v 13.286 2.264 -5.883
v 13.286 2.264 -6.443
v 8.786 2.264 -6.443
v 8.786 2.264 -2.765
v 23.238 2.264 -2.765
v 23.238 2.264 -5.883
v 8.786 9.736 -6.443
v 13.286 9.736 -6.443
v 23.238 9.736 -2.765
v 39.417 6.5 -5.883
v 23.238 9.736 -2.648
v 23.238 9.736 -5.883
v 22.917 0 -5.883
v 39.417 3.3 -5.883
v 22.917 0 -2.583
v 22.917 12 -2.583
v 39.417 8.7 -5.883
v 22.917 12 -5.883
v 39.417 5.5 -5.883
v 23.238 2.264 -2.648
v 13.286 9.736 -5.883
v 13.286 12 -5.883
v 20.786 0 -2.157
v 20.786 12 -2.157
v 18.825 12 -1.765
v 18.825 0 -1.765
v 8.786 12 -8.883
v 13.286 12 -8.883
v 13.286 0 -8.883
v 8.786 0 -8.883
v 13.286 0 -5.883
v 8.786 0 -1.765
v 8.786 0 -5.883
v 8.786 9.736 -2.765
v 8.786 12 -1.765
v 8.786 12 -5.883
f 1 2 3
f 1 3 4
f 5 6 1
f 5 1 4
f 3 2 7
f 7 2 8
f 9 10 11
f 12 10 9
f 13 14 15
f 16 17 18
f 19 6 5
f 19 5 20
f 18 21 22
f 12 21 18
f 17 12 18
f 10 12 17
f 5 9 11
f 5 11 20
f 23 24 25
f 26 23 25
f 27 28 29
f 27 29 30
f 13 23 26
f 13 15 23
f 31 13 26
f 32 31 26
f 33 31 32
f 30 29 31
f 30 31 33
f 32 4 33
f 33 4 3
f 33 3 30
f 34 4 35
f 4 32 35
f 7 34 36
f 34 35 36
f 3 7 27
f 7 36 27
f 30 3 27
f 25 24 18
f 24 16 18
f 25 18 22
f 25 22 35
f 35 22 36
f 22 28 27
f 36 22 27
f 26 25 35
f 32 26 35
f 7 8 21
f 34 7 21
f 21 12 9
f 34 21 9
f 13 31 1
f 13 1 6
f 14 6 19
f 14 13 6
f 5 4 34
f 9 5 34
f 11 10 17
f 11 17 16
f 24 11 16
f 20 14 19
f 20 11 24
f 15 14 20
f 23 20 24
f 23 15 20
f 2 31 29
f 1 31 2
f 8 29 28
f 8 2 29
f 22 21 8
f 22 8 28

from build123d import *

# Parameters (mm, degrees)
BOSS_EXTRUDE1_DEPTH = 12
CUT_EXTRUDE1_DEPTH  = 8
CUT_EXTRUDE2_DEPTH  = 8
SKETCH6_W           = 4.5
SKETCH6_H           = 12
BOSS_EXTRUDE2_DEPTH = 3
BOSS_EXTRUDE3_DEPTH = 12
CUT_EXTRUDE3_START  = -14.451452
SKETCH8_W           = 3.67843884
SKETCH8_H           = 7.47183246
CUT_EXTRUDE3_DEPTH  = 14.451452


with BuildPart() as part:
    # Sketch1 → Boss-Extrude1 (new body)
    with BuildSketch(Plane(origin=(0, 0, 0), x_dir=(1, 0, 0), z_dir=(0, 1, 0))):
        Polygon((20.786387433, 2.157277486), (8.786387433, 2.157277486), (8.786387433, 5.883484052), (39.417420271, 5.883484052), align=None)
    extrude(amount=BOSS_EXTRUDE1_DEPTH)

    # Sketch4 → Cut-Extrude1 (cut)
    with BuildSketch(Plane(origin=(0, 0, -5.883484052), x_dir=(-1, 0, 0), z_dir=(0, 0, -1))):
        Polygon((-39.417420271, 3.299999999), (-22.917420271, 0), (-39.417420271, 0), align=None)
    cut_extrude1 = extrude(amount=-CUT_EXTRUDE1_DEPTH, mode=Mode.SUBTRACT)

    # Sketch5 → Cut-Extrude2 (cut)
    with BuildSketch(Plane(origin=(0, 0, -5.883484052), x_dir=(-1, 0, 0), z_dir=(0, 0, -1))):
        Polygon((-39.417420271, 6.5), (-23.237839122, 9.73591623), (-23.237839122, 2.26408377), (-39.417420271, 5.5), align=None)
    extrude(amount=-CUT_EXTRUDE2_DEPTH, mode=Mode.SUBTRACT)

    # Mirror1: Cut-Extrude1 across plane
    add(cut_extrude1.mirror(Plane.ZX.offset(6)), mode=Mode.SUBTRACT)

    # Sketch6 → Boss-Extrude2 (add)
    with BuildSketch(Plane(origin=(0, 0, -5.883484052), x_dir=(-1, 0, 0), z_dir=(0, 0, -1))):
        with Locations((-11.03638743, 6)):
            Rectangle(SKETCH6_W, SKETCH6_H)
    extrude(amount=BOSS_EXTRUDE2_DEPTH)

    # Sketch7 → Boss-Extrude3 (add)
    with BuildSketch(Plane(origin=(0, 12, 0), x_dir=(1, 0, 0), z_dir=(0, 1, 0))):
        Polygon((20.786387433, 2.157277486), (18.825226081, 1.765045216), (8.786387433, 1.765045216), (8.786387433, 2.157277486), align=None)
    extrude(amount=-BOSS_EXTRUDE3_DEPTH)

    # Sketch8 → Cut-Extrude3 (cut)
    with BuildSketch(Plane.ZY.offset(-8.786387433).offset(CUT_EXTRUDE3_START)):
        with Locations((-4.604264636, 6)):
            Rectangle(SKETCH8_W, SKETCH8_H)
    extrude(amount=CUT_EXTRUDE3_DEPTH, mode=Mode.SUBTRACT)


solid = part.part
